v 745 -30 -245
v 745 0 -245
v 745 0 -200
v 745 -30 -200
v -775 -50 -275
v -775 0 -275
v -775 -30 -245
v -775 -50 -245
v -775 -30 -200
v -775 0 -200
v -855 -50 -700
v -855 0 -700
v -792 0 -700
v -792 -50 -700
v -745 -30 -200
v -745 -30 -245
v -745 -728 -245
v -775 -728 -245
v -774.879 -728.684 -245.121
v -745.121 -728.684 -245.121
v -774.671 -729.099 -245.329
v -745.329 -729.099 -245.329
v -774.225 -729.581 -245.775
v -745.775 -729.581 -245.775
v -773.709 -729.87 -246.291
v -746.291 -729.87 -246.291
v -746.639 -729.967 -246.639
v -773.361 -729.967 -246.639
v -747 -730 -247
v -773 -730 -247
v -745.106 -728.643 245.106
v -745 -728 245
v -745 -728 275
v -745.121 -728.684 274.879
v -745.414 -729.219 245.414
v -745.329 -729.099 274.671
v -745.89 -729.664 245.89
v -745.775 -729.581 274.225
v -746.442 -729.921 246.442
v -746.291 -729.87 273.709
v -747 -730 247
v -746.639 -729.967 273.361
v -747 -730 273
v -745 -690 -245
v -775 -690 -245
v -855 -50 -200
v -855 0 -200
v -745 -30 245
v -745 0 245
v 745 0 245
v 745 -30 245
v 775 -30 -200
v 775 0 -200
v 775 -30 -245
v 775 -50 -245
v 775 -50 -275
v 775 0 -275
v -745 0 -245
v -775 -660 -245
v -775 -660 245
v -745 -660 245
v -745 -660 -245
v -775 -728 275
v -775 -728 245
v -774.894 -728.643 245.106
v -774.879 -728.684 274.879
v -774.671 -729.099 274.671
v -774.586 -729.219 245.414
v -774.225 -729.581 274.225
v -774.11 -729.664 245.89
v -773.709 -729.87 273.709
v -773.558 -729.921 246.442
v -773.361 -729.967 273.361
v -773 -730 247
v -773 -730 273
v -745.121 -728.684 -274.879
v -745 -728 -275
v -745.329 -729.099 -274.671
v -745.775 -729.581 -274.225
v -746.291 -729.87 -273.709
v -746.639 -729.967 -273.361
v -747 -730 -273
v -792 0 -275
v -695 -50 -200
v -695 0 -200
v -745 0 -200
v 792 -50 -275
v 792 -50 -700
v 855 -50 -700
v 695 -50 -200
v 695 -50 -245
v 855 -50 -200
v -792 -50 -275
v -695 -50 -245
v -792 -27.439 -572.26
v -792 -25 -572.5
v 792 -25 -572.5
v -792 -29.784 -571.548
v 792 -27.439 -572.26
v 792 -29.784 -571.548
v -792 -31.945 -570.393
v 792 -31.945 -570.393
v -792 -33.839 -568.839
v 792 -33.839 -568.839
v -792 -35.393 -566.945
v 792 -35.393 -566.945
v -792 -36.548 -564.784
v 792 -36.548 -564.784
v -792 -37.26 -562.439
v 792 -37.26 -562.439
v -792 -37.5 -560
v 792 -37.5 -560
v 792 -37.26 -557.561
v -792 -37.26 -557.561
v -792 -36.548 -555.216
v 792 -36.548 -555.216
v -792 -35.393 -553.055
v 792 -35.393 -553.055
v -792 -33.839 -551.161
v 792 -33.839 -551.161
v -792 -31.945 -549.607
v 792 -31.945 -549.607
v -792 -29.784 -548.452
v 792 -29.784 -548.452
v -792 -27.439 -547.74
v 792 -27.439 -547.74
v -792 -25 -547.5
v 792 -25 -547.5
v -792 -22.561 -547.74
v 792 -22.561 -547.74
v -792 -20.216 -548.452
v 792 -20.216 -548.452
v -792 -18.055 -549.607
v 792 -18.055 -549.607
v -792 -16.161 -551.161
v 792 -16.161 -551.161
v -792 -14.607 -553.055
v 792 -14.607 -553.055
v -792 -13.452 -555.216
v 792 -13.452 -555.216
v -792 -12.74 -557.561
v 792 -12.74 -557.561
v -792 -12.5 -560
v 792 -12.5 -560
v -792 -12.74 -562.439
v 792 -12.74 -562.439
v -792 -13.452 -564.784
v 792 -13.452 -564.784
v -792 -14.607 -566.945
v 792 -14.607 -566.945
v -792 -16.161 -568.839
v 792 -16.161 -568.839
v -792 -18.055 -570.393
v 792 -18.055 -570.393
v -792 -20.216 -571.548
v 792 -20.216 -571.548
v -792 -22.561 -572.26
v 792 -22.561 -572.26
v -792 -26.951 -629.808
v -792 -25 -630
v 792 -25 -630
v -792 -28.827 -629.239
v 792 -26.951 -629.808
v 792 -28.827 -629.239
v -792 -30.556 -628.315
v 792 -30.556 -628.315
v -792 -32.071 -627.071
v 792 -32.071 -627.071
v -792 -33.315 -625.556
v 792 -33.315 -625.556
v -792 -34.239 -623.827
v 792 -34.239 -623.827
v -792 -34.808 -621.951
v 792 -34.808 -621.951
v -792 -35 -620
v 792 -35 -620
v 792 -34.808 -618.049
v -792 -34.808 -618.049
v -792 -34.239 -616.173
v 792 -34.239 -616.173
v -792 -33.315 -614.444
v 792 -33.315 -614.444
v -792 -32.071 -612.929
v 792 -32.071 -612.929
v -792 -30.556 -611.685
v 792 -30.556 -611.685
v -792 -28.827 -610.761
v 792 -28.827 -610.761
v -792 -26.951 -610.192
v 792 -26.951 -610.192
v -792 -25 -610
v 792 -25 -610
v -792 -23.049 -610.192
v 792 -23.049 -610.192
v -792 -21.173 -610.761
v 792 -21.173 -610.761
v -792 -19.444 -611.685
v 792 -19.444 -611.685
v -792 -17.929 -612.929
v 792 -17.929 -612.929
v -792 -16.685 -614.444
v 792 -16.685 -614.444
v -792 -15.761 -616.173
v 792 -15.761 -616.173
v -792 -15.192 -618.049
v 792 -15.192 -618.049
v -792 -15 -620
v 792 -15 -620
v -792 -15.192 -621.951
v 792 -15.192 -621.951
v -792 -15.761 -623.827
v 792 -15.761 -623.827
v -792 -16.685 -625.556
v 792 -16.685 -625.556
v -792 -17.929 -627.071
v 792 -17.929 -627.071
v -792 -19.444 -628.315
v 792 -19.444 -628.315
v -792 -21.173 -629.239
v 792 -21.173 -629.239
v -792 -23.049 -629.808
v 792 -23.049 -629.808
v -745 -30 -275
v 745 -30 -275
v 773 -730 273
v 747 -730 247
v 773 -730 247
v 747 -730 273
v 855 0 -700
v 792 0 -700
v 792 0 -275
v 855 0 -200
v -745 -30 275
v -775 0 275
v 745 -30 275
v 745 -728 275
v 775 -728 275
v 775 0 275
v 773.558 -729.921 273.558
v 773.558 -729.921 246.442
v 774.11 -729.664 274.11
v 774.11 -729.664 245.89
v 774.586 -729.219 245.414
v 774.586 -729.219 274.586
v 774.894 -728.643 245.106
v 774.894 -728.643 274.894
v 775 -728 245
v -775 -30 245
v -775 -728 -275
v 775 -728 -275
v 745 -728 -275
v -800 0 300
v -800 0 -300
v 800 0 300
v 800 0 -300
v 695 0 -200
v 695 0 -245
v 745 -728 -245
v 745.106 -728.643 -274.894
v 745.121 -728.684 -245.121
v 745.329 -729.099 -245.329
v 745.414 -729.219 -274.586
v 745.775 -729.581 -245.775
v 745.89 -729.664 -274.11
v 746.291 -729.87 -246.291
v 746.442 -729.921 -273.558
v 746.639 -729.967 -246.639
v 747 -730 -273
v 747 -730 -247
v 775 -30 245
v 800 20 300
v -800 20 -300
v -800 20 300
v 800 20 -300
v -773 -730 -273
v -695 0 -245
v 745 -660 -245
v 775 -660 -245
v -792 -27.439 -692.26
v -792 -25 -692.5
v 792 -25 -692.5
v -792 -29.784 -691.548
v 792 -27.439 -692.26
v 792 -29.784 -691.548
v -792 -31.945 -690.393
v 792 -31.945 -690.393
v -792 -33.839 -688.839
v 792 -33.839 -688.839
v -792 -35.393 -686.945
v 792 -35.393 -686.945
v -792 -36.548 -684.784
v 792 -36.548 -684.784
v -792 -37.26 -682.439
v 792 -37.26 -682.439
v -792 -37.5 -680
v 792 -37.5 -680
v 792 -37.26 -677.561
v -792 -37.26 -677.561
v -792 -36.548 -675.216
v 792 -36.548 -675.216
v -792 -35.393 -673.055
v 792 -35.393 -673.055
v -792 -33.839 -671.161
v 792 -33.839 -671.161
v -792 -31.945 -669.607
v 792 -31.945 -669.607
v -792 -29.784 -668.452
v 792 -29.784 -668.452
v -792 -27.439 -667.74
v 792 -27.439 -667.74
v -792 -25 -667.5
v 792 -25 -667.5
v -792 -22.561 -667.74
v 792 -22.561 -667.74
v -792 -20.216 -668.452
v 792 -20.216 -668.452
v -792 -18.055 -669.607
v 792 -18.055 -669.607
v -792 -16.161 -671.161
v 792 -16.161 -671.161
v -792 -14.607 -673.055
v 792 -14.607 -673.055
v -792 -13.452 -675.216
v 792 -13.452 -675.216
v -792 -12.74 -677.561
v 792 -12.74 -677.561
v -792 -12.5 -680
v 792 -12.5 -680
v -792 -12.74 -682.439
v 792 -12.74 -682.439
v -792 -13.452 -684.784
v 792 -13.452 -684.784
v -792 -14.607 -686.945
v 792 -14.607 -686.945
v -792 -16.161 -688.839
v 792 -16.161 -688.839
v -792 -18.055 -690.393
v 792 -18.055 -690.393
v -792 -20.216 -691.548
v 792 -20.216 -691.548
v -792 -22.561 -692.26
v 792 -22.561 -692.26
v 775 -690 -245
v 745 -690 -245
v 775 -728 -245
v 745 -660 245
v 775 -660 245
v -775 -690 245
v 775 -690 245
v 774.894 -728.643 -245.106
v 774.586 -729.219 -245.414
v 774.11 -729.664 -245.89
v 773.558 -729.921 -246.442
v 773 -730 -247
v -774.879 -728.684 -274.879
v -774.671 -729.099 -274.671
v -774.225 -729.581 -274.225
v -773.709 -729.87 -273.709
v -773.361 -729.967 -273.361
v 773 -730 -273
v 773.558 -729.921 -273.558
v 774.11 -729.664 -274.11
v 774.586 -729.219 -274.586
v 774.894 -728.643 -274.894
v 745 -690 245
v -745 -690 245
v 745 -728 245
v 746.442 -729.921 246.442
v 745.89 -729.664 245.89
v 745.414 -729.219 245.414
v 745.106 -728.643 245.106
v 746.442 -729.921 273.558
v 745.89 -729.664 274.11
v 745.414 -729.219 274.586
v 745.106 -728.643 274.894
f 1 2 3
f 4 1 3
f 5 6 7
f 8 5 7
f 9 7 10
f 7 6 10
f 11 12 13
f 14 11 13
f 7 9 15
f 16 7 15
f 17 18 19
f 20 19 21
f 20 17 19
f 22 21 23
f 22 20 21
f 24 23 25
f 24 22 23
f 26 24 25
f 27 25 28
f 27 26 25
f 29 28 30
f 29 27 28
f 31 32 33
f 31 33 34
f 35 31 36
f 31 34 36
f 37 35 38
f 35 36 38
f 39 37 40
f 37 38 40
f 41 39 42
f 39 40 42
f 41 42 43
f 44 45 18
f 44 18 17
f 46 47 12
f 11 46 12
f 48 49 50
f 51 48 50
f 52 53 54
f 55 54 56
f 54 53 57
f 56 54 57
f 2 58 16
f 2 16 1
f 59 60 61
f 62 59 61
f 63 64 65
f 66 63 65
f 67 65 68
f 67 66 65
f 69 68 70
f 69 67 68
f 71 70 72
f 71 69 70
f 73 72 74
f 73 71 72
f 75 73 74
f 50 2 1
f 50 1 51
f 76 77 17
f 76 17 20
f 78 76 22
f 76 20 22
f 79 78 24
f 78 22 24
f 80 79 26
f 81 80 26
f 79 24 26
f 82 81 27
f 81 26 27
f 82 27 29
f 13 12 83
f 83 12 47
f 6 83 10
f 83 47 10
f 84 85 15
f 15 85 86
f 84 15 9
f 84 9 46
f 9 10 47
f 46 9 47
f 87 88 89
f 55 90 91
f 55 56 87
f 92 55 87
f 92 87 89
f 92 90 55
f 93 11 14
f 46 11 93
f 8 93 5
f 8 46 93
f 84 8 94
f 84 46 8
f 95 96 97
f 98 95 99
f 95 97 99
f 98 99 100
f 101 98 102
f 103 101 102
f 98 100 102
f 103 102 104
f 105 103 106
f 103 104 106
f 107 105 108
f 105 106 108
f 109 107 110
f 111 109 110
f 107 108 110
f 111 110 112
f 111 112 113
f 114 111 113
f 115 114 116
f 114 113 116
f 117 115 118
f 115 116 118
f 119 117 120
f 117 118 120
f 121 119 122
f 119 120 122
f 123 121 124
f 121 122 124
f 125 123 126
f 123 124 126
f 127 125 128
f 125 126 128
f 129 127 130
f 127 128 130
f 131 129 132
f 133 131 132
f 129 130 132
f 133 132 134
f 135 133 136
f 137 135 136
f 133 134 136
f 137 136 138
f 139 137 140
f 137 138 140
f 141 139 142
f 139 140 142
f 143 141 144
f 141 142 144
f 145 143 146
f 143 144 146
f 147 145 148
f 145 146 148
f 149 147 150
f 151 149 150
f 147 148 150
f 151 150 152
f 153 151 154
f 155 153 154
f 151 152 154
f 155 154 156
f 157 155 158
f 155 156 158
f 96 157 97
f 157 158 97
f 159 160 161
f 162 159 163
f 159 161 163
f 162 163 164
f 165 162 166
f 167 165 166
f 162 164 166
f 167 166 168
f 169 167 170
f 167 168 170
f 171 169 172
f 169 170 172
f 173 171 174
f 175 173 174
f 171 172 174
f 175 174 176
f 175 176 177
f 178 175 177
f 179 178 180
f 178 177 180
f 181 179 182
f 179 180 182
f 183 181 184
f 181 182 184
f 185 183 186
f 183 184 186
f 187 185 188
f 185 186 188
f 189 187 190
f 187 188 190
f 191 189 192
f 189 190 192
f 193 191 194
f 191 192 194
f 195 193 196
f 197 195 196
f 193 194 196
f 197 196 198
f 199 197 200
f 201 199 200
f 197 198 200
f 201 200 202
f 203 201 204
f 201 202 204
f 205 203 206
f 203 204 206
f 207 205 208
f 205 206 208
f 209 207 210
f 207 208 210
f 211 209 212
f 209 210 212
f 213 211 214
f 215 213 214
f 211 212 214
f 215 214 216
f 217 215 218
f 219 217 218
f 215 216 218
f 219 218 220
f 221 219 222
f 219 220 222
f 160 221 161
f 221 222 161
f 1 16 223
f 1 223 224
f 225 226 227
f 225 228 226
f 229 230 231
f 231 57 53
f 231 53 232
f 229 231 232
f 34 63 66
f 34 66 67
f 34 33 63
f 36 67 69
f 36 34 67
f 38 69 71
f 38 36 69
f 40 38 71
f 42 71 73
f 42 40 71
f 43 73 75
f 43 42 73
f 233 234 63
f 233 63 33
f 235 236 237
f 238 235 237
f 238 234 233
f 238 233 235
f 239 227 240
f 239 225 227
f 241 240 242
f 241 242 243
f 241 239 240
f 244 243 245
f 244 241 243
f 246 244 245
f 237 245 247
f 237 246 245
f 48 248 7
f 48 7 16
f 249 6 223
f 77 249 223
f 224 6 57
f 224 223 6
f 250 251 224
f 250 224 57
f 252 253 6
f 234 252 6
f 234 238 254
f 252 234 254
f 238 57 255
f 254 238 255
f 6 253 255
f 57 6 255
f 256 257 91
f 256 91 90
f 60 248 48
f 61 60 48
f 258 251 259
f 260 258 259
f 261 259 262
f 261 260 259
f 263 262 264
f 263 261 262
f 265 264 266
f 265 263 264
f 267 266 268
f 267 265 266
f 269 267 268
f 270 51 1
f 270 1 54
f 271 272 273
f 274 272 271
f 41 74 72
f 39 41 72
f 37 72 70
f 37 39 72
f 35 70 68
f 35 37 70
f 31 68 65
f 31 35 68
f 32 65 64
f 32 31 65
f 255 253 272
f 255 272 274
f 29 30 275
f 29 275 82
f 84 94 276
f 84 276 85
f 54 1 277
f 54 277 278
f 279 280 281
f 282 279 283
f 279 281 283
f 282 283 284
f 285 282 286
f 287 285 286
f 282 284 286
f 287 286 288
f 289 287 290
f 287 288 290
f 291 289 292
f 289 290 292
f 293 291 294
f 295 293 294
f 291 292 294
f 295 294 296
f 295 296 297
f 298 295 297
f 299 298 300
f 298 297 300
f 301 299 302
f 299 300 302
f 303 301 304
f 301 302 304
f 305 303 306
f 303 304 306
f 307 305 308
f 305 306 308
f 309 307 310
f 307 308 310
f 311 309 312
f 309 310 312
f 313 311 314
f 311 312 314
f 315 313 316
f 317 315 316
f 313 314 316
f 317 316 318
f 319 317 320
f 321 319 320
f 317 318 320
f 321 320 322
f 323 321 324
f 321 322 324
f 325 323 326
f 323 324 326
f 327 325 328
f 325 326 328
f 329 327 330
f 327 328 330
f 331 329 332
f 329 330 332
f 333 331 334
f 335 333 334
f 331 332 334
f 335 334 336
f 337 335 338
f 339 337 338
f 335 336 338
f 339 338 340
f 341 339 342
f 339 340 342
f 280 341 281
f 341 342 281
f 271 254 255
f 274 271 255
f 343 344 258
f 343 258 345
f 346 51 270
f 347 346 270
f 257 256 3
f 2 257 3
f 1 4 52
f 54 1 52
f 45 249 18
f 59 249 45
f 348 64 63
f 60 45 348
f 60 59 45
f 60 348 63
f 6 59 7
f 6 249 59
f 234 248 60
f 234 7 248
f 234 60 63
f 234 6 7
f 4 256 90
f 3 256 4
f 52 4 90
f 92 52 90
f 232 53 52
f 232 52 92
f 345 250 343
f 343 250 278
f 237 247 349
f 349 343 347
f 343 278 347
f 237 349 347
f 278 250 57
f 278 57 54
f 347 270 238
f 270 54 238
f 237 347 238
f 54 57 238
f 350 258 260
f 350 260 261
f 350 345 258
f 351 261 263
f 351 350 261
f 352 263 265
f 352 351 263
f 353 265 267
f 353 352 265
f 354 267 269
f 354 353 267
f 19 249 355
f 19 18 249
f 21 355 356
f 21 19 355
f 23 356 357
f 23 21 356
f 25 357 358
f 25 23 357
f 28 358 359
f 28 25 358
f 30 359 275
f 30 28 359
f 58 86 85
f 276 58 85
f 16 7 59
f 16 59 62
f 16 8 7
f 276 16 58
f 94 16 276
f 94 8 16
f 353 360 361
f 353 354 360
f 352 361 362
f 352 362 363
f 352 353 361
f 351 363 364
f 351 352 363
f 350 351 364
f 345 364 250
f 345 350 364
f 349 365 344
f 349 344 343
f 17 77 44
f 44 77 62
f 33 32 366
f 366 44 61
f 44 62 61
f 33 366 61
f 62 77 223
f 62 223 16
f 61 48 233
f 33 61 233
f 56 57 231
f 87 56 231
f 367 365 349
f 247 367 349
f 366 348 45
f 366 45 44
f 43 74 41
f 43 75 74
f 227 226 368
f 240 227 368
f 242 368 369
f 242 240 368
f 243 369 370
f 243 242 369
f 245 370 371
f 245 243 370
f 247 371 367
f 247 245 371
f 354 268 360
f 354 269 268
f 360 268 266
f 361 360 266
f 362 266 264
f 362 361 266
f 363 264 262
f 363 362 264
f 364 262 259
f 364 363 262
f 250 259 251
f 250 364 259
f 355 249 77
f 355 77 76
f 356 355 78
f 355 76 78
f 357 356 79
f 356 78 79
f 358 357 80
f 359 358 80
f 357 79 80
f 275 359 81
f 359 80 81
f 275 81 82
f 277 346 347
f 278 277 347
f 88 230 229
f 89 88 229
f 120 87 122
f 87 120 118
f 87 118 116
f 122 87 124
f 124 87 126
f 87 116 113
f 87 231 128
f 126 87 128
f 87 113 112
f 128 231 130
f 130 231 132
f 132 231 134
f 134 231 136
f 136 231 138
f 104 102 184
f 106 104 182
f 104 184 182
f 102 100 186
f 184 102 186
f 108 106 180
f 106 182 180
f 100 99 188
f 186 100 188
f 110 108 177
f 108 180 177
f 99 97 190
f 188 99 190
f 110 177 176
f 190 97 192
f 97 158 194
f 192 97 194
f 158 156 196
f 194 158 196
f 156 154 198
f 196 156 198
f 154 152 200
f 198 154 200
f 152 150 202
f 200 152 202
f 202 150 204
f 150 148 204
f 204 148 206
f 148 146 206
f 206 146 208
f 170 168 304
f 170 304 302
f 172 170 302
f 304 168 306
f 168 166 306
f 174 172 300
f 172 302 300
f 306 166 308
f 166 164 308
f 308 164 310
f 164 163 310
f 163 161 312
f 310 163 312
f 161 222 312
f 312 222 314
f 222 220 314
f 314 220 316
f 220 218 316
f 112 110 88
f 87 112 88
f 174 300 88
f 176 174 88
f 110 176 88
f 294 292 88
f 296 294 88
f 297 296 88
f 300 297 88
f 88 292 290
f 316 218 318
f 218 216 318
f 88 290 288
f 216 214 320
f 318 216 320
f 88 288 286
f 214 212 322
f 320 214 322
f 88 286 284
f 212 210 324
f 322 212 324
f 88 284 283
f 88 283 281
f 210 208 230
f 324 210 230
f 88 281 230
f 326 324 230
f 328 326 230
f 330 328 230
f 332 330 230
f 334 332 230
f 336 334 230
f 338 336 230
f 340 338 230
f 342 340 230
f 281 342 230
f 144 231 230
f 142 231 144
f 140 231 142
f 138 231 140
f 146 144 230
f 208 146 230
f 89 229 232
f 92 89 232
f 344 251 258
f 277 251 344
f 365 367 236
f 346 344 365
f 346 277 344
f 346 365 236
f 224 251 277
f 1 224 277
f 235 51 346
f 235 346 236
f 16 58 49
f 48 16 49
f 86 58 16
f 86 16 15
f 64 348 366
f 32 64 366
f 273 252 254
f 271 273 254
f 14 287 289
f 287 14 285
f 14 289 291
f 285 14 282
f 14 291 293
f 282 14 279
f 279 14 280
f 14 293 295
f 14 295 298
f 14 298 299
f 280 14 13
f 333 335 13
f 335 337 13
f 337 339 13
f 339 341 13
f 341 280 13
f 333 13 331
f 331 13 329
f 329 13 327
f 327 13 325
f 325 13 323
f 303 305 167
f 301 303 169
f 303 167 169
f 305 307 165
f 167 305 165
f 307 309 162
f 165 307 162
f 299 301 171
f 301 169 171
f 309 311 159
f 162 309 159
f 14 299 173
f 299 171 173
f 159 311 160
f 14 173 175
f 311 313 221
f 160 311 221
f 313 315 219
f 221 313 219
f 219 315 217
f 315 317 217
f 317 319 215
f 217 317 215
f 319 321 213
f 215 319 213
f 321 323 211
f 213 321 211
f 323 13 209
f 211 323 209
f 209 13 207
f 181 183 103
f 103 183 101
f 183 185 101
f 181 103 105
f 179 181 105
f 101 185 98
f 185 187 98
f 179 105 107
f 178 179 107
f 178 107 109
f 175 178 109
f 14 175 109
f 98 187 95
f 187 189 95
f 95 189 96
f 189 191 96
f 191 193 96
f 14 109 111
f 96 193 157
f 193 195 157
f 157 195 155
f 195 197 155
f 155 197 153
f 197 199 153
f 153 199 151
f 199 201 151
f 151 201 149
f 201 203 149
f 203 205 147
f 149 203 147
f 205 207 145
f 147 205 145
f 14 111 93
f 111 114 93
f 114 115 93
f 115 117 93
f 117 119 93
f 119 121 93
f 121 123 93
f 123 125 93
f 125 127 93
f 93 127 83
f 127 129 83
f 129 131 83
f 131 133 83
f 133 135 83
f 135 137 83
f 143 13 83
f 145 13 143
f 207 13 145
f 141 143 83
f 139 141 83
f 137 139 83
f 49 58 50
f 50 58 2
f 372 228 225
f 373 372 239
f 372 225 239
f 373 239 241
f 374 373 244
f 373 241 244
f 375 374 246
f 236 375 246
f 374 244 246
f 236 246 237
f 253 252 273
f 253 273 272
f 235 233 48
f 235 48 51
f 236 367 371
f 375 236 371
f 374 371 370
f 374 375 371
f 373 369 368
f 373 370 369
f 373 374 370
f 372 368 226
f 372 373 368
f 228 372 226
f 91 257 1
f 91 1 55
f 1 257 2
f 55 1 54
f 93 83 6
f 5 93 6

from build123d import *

# Parameters (mm, degrees)
SKETCH1_W             = 1600
SKETCH1_H             = 600
BOSS_EXTRUDE1_DEPTH   = 20
SKETCH2_W             = 1550
SKETCH2_H             = 550
SKETCH2_W_2           = 1490
SKETCH2_H_2           = 490
BOSS_EXTRUDE2_DEPTH   = 30
SKETCH3_W             = 30
SKETCH3_H             = 30
BOSS_EXTRUDE3_DEPTH   = 700
BOSS_EXTRUDE4_START   = -40
SKETCH4_W             = 30
SKETCH4_H             = 550
BOSS_EXTRUDE4_DEPTH   = 30
FILLET1_R             = 2
BOSS_EXTRUDE5_DEPTH   = 50
BOSS_EXTRUDE5_2_DEPTH = 50
SKETCH7_R             = 10
BOSS_EXTRUDE6_DEPTH   = 1584
SKETCH8_R             = 12.5
BOSS_EXTRUDE7_DEPTH   = 1584
SKETCH15_W            = 80
SKETCH15_H            = 45
BOSS_EXTRUDE8_DEPTH   = 20
SKETCH16_W            = 50
SKETCH16_H            = 45
BOSS_EXTRUDE9_DEPTH   = 50


with BuildPart() as part:
    # Sketch1 → Boss-Extrude1 (new body)
    with BuildSketch(Plane(origin=(0, 0, 0), x_dir=(1, 0, 0), z_dir=(0, 1, 0))):
        Rectangle(SKETCH1_W, SKETCH1_H)
    extrude(amount=BOSS_EXTRUDE1_DEPTH)

    # Sketch2 → Boss-Extrude2 (add)
    with BuildSketch(Plane.XZ):
        Rectangle(SKETCH2_W, SKETCH2_H)
        Rectangle(SKETCH2_W_2, SKETCH2_H_2, mode=Mode.SUBTRACT)
    extrude(amount=BOSS_EXTRUDE2_DEPTH)

    # Sketch3 → Boss-Extrude3 (add)
    with BuildSketch(Plane.XZ.offset(30)):
        with Locations((-760, -260)):
            Rectangle(SKETCH3_W, SKETCH3_H)
        with Locations((760, -260)):
            Rectangle(SKETCH3_W, SKETCH3_H)
        with Locations((-760, 260)):
            Rectangle(SKETCH3_W, SKETCH3_H)
        with Locations((760, 260)):
            Rectangle(SKETCH3_W, SKETCH3_H)
    extrude(amount=BOSS_EXTRUDE3_DEPTH)

    # Sketch4 → Boss-Extrude4 (add)
    with BuildSketch(Plane.XZ.offset(730).offset(BOSS_EXTRUDE4_START)):
        with Locations((-760, 0)):
            Rectangle(SKETCH4_W, SKETCH4_H)
        with Locations((760, 0)):
            Rectangle(SKETCH4_W, SKETCH4_H)
    extrude(amount=-BOSS_EXTRUDE4_DEPTH)

    # Fillet1
    fillet1_edges = [part.edges().sort_by_distance(p)[0] for p in [
        (-775, -730, -260),
        (-760, -730, -275),
        (-745, -730, -260),
        (-760, -730, -245),
        (760, -730, -275),
        (775, -730, -260),
        (760, -730, -245),
        (745, -730, -260),
        (-760, -730, 245),
        (-745, -730, 260),
        (-760, -730, 275),
        (-775, -730, 260),
        (760, -730, 245),
        (775, -730, 260),
        (760, -730, 275),
        (745, -730, 260),
    ]]
    fillet(fillet1_edges, radius=FILLET1_R)


with BuildPart() as body_2:
    # Sketch5 → Boss-Extrude5 (new body)
    with BuildSketch(Plane.XZ):
        Polygon((775, -275), (792, -275), (792, -700), (855, -700), (855, -200), (775, -200), align=None)
    extrude(amount=BOSS_EXTRUDE5_DEPTH)



with BuildPart() as body_3:
    # Sketch5 → Boss-Extrude5 2 (new body)
    with BuildSketch(Plane.XZ):
        Polygon((-775, -275), (-775, -200), (-855, -200), (-855, -700), (-792, -700), (-792, -275), align=None)
    extrude(amount=BOSS_EXTRUDE5_2_DEPTH)


with BuildPart() as body_2_1:
    add(body_2.part)

    add(body_3.part)  # Boss-Extrude6 merges body 3
    # Sketch7 → Boss-Extrude6 (add)
    with BuildSketch(Plane.ZY.offset(-792)):
        with Locations(Location((-620, -25, 0), (0, 0, 180))):
            Circle(SKETCH7_R)
    extrude(amount=BOSS_EXTRUDE6_DEPTH)

    # Sketch8 → Boss-Extrude7 (add)
    with BuildSketch(Plane.ZY.offset(-792)):
        with Locations(Location((-680, -25, 0), (0, 0, 180))):
            Circle(SKETCH8_R)
        with Locations(Location((-560, -25, 0), (0, 0, 180))):
            Circle(SKETCH8_R)
    extrude(amount=BOSS_EXTRUDE7_DEPTH)

    # Sketch15 → Boss-Extrude8 (add)
    with BuildSketch(Plane.XZ.offset(50)):
        with Locations((735, -222.5)):
            Rectangle(SKETCH15_W, SKETCH15_H)
        with Locations((-735, -222.5)):
            Rectangle(SKETCH15_W, SKETCH15_H)
    extrude(amount=-BOSS_EXTRUDE8_DEPTH)

    # Sketch16 → Boss-Extrude9 (add)
    with BuildSketch(Plane.XZ):
        with Locations((720, -222.5)):
            Rectangle(SKETCH16_W, SKETCH16_H)
        with Locations((-720, -222.5)):
            Rectangle(SKETCH16_W, SKETCH16_H)
    extrude(amount=BOSS_EXTRUDE9_DEPTH)


solid = Compound([part.part, body_2_1.part])
